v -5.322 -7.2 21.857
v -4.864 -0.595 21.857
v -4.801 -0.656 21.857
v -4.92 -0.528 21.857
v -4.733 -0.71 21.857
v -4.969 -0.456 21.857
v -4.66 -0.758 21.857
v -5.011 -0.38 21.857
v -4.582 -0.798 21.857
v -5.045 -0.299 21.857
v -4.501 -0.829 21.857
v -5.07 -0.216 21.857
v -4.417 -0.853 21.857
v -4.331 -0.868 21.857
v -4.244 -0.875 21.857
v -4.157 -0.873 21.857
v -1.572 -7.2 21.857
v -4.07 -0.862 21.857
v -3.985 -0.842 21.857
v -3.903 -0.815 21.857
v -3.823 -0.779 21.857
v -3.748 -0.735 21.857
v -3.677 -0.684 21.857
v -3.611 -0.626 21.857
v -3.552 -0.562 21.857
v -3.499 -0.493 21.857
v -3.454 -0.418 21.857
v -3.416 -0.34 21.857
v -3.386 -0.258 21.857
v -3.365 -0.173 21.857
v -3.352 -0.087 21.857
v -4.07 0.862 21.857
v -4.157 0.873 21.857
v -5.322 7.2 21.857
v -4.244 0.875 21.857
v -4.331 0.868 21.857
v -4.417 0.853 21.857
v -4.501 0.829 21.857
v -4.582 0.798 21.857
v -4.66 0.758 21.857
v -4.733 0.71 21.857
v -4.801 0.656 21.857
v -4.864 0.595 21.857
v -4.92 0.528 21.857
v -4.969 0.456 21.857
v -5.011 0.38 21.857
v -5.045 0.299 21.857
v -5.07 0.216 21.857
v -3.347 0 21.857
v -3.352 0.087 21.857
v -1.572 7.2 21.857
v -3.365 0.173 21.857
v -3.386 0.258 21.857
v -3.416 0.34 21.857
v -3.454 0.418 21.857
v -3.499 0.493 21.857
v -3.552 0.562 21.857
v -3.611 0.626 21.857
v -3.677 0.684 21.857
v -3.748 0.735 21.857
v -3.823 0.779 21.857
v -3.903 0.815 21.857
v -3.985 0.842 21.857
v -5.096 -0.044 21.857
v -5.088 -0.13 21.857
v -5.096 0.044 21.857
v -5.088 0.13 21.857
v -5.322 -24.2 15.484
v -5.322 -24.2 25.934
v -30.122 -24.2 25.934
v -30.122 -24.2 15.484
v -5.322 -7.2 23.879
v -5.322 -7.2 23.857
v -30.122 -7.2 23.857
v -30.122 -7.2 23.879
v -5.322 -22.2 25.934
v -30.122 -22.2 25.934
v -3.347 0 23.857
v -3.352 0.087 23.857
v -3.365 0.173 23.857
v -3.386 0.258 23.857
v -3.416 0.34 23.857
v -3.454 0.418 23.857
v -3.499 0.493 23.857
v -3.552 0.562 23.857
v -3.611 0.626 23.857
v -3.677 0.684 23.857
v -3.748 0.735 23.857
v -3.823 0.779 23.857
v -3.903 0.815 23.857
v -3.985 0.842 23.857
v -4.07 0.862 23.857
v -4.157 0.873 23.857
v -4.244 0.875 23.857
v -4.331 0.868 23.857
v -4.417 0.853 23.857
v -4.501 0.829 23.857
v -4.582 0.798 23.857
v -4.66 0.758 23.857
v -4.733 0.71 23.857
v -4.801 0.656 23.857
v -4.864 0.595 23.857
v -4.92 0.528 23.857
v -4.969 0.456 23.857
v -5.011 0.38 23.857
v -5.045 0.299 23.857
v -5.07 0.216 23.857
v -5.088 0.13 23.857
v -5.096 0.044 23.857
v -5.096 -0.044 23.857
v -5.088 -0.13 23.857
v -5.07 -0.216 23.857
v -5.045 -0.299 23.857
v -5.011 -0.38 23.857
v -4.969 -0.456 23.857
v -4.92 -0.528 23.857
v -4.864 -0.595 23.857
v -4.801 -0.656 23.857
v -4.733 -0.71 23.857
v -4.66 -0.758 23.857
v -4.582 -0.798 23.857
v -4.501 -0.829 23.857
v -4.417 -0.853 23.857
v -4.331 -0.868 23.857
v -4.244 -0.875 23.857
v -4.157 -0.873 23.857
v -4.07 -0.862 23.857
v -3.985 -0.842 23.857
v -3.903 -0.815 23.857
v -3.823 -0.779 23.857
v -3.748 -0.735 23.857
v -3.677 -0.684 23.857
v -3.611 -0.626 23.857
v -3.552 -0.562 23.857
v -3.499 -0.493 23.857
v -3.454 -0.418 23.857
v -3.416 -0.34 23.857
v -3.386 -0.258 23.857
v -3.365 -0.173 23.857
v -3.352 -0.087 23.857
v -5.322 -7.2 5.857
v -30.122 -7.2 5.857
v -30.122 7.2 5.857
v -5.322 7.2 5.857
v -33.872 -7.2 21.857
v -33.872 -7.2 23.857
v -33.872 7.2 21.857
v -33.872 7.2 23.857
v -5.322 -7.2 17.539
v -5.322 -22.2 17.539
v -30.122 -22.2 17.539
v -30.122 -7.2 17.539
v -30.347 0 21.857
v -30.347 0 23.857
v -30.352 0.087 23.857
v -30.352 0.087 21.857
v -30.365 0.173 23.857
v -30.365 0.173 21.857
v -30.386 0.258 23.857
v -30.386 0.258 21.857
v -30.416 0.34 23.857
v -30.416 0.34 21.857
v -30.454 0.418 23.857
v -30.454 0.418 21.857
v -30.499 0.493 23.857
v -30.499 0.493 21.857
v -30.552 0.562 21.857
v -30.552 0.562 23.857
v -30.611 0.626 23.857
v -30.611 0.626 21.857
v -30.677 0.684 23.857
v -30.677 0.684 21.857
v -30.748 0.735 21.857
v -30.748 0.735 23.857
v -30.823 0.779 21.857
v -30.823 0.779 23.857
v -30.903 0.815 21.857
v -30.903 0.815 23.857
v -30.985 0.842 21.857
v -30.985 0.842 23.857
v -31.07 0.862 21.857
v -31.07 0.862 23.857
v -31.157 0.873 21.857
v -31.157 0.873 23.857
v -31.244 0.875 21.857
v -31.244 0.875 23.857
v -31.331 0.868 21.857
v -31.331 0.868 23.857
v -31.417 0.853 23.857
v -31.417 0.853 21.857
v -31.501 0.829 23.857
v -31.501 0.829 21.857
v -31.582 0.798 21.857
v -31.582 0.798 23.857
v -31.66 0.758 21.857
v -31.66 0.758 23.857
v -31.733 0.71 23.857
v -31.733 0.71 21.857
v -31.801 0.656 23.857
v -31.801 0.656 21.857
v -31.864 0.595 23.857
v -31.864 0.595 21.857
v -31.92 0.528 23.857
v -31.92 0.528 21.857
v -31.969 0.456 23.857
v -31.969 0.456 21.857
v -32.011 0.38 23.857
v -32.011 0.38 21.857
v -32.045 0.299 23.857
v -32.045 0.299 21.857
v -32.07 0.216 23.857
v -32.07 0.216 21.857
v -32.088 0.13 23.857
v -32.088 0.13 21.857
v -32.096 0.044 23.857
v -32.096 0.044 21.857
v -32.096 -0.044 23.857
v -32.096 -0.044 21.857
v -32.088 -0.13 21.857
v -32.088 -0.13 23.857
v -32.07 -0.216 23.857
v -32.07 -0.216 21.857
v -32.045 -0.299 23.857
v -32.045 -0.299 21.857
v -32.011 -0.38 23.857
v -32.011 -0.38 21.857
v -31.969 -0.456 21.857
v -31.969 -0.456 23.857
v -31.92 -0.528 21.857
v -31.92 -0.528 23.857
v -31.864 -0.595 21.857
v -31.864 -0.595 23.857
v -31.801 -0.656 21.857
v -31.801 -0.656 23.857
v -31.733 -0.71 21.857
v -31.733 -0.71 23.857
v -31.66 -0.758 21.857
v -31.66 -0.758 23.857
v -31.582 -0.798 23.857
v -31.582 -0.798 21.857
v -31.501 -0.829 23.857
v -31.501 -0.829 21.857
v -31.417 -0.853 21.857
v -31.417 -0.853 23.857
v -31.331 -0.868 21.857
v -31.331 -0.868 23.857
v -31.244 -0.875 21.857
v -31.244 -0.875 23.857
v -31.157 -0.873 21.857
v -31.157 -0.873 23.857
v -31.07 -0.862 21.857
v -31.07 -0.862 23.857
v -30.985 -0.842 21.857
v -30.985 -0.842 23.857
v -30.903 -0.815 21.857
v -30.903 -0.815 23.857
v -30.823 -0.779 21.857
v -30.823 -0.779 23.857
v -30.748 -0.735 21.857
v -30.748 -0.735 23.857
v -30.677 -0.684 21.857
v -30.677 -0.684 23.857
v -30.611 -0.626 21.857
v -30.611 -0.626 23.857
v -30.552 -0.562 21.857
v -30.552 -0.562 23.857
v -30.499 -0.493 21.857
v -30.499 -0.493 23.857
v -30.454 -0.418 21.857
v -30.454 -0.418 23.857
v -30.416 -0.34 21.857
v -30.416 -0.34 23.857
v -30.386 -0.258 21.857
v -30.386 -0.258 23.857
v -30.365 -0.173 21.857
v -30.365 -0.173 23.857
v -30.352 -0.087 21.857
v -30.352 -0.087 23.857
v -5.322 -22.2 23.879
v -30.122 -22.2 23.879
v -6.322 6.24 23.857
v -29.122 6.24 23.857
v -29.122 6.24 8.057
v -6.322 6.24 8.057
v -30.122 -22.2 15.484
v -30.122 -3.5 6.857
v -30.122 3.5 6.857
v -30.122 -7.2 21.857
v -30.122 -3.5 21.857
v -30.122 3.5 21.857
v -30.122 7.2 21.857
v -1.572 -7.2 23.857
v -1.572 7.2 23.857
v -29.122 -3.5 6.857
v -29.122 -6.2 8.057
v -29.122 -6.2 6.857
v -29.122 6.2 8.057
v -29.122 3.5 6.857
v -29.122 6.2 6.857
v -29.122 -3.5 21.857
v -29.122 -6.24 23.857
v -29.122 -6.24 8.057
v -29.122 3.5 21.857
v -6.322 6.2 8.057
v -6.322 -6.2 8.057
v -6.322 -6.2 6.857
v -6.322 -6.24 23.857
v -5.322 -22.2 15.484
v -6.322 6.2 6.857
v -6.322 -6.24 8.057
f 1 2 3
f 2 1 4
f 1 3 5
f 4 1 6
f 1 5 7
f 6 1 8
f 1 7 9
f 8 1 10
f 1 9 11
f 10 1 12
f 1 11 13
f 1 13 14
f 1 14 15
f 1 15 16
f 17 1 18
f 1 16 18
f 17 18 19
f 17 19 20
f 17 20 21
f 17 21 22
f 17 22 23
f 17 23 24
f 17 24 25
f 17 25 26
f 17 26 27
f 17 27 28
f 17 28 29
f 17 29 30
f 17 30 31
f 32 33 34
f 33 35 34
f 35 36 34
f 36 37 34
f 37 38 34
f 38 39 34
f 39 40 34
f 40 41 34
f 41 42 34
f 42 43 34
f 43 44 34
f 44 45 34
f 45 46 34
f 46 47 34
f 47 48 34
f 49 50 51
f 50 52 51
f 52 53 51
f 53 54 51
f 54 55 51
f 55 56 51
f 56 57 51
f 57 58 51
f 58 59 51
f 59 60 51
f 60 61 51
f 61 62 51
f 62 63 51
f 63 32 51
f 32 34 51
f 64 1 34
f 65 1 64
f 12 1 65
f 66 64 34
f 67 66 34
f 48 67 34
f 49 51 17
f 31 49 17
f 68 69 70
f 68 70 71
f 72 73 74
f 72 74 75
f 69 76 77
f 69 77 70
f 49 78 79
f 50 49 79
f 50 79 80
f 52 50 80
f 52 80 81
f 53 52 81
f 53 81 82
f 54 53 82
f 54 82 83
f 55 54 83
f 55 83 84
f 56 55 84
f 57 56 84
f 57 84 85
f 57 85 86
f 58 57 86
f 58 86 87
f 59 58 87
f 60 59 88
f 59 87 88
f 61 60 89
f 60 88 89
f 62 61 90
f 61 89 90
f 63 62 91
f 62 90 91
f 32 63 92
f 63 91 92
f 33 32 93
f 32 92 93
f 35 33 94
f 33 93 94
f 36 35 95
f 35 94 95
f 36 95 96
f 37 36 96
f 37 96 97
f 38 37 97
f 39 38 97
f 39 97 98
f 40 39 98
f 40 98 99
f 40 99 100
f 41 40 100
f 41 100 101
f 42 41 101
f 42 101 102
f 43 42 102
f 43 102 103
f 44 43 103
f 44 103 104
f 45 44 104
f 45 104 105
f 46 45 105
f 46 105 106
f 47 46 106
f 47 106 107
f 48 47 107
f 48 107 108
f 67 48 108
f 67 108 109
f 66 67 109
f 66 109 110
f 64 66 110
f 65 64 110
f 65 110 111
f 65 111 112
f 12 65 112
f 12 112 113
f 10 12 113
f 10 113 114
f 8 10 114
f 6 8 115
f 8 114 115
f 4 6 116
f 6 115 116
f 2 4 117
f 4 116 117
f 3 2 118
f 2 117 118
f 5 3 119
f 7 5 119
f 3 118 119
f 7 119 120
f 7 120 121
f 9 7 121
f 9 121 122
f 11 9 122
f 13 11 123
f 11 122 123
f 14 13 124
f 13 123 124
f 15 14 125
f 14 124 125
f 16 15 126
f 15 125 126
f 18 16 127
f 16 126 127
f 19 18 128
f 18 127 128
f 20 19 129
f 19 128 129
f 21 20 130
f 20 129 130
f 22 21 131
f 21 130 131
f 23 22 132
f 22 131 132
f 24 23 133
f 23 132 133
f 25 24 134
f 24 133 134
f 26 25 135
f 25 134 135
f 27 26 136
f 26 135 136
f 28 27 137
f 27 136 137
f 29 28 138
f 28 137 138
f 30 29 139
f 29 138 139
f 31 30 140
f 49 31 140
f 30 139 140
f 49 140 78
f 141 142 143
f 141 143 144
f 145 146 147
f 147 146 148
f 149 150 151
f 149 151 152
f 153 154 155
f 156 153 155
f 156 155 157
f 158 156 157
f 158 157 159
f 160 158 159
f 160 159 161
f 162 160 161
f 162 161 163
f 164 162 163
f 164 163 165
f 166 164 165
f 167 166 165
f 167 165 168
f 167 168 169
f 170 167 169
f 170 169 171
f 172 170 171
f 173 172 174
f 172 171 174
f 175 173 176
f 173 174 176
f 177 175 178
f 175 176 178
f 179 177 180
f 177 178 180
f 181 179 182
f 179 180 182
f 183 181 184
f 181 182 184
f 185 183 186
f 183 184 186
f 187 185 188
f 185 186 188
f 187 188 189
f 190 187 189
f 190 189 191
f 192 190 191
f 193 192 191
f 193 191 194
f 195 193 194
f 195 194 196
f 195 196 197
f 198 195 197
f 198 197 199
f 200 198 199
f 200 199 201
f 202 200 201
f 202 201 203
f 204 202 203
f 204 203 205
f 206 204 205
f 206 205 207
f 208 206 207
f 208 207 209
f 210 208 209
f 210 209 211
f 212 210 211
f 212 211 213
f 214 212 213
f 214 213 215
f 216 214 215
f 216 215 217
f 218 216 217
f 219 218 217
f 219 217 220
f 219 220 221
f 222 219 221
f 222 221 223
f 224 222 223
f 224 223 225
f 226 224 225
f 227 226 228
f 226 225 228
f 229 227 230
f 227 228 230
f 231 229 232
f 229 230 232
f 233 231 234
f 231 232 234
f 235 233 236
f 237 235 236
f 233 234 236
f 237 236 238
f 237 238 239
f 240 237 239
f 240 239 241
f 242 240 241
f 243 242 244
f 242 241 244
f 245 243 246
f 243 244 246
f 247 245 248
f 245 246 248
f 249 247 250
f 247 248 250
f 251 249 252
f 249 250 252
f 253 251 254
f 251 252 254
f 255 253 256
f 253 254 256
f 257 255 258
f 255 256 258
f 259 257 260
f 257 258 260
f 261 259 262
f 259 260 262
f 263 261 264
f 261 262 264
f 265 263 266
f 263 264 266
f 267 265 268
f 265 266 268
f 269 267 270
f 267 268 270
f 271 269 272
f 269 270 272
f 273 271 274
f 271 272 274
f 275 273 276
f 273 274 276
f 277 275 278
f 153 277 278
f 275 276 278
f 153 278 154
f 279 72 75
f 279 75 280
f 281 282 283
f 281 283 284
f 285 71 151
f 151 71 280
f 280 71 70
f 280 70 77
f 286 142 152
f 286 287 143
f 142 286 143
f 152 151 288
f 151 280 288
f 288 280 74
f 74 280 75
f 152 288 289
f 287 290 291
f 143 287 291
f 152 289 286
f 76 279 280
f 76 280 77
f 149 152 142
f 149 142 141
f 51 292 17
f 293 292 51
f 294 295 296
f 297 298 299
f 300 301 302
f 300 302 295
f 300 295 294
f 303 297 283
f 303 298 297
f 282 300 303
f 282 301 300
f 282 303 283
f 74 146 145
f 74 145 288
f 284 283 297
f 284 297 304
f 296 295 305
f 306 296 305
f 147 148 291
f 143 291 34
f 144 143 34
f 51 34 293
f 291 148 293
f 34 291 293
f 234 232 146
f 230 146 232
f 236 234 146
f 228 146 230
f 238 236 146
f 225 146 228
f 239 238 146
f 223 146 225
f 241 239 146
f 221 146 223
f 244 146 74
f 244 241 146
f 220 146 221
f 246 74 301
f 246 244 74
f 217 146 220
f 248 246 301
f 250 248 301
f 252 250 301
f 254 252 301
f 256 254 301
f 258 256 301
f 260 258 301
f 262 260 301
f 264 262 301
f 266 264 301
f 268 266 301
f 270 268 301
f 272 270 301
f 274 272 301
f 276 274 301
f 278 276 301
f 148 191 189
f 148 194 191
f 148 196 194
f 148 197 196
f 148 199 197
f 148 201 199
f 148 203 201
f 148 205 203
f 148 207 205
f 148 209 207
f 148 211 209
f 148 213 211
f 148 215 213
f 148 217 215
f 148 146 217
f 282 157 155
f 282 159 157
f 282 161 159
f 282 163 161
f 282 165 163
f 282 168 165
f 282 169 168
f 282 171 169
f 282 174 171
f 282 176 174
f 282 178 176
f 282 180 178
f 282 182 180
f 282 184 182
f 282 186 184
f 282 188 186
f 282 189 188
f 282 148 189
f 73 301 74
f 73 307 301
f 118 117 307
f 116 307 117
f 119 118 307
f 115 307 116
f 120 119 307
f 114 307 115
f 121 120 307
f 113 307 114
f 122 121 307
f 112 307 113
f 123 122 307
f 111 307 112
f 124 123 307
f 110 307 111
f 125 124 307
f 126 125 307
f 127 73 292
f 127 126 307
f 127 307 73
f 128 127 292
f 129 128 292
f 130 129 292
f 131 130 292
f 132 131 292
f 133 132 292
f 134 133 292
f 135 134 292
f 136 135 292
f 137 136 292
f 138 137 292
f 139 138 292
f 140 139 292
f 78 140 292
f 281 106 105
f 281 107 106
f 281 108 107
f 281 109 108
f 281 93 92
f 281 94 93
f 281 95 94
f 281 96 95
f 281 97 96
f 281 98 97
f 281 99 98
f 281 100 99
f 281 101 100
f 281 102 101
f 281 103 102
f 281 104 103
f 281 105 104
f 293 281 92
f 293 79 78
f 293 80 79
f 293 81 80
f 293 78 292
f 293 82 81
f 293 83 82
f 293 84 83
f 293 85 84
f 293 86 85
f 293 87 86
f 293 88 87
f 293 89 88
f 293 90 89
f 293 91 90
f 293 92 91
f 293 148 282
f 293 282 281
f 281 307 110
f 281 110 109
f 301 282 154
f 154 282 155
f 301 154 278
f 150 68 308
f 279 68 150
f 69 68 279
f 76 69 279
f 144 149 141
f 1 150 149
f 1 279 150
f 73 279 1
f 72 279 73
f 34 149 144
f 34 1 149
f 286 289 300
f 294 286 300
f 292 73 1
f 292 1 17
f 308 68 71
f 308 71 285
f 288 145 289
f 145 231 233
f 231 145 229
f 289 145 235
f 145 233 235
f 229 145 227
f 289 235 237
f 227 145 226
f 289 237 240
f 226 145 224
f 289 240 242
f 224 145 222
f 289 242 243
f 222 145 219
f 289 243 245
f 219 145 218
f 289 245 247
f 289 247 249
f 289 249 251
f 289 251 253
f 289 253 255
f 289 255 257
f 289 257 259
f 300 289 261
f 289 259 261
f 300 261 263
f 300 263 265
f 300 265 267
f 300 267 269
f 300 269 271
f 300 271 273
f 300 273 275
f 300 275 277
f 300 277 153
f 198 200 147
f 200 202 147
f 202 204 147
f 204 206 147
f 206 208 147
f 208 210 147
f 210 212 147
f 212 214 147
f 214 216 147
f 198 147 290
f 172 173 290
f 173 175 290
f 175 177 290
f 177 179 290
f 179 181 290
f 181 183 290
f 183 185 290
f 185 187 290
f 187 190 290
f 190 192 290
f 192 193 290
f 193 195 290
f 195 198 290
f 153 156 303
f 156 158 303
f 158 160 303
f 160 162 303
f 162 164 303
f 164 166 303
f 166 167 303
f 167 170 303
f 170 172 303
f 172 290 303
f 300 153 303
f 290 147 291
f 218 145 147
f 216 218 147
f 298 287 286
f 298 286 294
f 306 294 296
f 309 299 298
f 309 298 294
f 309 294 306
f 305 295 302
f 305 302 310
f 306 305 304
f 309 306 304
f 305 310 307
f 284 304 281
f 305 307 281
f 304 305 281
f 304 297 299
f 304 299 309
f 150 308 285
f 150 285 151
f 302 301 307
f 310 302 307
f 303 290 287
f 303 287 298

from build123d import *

# Parameters (mm, degrees)
F0_W          = 24.8
F0_H          = 18
F0_W_2        = 22.8
F0_H_2        = 16
F1_DEPTH      = 6.2
F1_DEPTH_BACK = 6.2
F2_W          = 24.8
F2_H          = 18
F3_DEPTH      = 1
F5_W          = 22.8
F5_H          = 12.48
F6_DEPTH      = 15.8
F7_W          = 9.005438
F7_H          = 7
F8_DEPTH      = 17
F10_W         = 32.3
F10_H         = 14.4
F10_W_2       = 22.8
F10_H_2       = 12.48
F11_DEPTH     = 2
F12_R         = 0.875
F13_DEPTH     = 25
F15_DEPTH     = 24.8


with BuildPart() as f1:
    # F0 (on Front) → F1 (new body, two sides)
    with BuildSketch(Plane.XZ) as f1_sk:
        with Locations((-17.722324, 14.856741)):
            Rectangle(F0_W, F0_H)
        with Locations((-17.722324, 14.856741)):
            Rectangle(F0_W_2, F0_H_2, mode=Mode.SUBTRACT)
    extrude(amount=F1_DEPTH)
    extrude(f1_sk.sketch, amount=-F1_DEPTH_BACK)

    # F2 (on face) → F3 (join)
    with BuildSketch(Plane.XZ.offset(6.2)):
        with Locations((-17.722324, 14.856741)):
            Rectangle(F2_W, F2_H)
    extrude(amount=F3_DEPTH)

    # F4: F1 across plane


with BuildPart() as f1_1:
    add(f1.part)
    add(f1.part.mirror(Plane.XZ))

    # F5 (on face) → F6 (cut)
    with BuildSketch(Plane.XY.offset(23.856741)):
        with Locations((-17.722324, 0)):
            Rectangle(F5_W, F5_H)
    extrude(amount=-F6_DEPTH, mode=Mode.SUBTRACT)

    # F7 (on face) → F8 (cut, through all)
    with BuildSketch(Plane.XY.offset(23.856741)):
        with Locations((-31.029159, 0)):
            Rectangle(F7_W, F7_H)
    extrude(amount=-F8_DEPTH, mode=Mode.SUBTRACT)

    # F10 (on face) → F11 (join)
    with BuildSketch(Plane.XY.offset(23.856741)):
        with Locations((-17.722324, 0)):
            Rectangle(F10_W, F10_H)
        with Locations((-17.722324, 0)):
            Rectangle(F10_W_2, F10_H_2, mode=Mode.SUBTRACT)
    extrude(amount=-F11_DEPTH)

    # F12 (on face) → F13 (cut)
    with BuildSketch(Plane.XY.offset(23.856741)):
        with Locations((-31.222324, 0)):
            Circle(F12_R)
        with Locations((-4.222324, 0)):
            Circle(F12_R)
    extrude(amount=-F13_DEPTH, mode=Mode.SUBTRACT)

    # F14 (on face) → F15 (join, through all)
    with BuildSketch(Plane.YZ.offset(-5.322324)):
        Polygon((-7.2, 21.856741), (-7.2, 23.879181), (-22.2, 23.879181), (-22.2, 25.934181), (-24.2, 25.934181), (-24.2, 15.484181), (-22.2, 15.484181), (-22.2, 17.539181), (-7.2, 17.539181), align=None)
    extrude(amount=-F15_DEPTH)


solid = f1_1.part
